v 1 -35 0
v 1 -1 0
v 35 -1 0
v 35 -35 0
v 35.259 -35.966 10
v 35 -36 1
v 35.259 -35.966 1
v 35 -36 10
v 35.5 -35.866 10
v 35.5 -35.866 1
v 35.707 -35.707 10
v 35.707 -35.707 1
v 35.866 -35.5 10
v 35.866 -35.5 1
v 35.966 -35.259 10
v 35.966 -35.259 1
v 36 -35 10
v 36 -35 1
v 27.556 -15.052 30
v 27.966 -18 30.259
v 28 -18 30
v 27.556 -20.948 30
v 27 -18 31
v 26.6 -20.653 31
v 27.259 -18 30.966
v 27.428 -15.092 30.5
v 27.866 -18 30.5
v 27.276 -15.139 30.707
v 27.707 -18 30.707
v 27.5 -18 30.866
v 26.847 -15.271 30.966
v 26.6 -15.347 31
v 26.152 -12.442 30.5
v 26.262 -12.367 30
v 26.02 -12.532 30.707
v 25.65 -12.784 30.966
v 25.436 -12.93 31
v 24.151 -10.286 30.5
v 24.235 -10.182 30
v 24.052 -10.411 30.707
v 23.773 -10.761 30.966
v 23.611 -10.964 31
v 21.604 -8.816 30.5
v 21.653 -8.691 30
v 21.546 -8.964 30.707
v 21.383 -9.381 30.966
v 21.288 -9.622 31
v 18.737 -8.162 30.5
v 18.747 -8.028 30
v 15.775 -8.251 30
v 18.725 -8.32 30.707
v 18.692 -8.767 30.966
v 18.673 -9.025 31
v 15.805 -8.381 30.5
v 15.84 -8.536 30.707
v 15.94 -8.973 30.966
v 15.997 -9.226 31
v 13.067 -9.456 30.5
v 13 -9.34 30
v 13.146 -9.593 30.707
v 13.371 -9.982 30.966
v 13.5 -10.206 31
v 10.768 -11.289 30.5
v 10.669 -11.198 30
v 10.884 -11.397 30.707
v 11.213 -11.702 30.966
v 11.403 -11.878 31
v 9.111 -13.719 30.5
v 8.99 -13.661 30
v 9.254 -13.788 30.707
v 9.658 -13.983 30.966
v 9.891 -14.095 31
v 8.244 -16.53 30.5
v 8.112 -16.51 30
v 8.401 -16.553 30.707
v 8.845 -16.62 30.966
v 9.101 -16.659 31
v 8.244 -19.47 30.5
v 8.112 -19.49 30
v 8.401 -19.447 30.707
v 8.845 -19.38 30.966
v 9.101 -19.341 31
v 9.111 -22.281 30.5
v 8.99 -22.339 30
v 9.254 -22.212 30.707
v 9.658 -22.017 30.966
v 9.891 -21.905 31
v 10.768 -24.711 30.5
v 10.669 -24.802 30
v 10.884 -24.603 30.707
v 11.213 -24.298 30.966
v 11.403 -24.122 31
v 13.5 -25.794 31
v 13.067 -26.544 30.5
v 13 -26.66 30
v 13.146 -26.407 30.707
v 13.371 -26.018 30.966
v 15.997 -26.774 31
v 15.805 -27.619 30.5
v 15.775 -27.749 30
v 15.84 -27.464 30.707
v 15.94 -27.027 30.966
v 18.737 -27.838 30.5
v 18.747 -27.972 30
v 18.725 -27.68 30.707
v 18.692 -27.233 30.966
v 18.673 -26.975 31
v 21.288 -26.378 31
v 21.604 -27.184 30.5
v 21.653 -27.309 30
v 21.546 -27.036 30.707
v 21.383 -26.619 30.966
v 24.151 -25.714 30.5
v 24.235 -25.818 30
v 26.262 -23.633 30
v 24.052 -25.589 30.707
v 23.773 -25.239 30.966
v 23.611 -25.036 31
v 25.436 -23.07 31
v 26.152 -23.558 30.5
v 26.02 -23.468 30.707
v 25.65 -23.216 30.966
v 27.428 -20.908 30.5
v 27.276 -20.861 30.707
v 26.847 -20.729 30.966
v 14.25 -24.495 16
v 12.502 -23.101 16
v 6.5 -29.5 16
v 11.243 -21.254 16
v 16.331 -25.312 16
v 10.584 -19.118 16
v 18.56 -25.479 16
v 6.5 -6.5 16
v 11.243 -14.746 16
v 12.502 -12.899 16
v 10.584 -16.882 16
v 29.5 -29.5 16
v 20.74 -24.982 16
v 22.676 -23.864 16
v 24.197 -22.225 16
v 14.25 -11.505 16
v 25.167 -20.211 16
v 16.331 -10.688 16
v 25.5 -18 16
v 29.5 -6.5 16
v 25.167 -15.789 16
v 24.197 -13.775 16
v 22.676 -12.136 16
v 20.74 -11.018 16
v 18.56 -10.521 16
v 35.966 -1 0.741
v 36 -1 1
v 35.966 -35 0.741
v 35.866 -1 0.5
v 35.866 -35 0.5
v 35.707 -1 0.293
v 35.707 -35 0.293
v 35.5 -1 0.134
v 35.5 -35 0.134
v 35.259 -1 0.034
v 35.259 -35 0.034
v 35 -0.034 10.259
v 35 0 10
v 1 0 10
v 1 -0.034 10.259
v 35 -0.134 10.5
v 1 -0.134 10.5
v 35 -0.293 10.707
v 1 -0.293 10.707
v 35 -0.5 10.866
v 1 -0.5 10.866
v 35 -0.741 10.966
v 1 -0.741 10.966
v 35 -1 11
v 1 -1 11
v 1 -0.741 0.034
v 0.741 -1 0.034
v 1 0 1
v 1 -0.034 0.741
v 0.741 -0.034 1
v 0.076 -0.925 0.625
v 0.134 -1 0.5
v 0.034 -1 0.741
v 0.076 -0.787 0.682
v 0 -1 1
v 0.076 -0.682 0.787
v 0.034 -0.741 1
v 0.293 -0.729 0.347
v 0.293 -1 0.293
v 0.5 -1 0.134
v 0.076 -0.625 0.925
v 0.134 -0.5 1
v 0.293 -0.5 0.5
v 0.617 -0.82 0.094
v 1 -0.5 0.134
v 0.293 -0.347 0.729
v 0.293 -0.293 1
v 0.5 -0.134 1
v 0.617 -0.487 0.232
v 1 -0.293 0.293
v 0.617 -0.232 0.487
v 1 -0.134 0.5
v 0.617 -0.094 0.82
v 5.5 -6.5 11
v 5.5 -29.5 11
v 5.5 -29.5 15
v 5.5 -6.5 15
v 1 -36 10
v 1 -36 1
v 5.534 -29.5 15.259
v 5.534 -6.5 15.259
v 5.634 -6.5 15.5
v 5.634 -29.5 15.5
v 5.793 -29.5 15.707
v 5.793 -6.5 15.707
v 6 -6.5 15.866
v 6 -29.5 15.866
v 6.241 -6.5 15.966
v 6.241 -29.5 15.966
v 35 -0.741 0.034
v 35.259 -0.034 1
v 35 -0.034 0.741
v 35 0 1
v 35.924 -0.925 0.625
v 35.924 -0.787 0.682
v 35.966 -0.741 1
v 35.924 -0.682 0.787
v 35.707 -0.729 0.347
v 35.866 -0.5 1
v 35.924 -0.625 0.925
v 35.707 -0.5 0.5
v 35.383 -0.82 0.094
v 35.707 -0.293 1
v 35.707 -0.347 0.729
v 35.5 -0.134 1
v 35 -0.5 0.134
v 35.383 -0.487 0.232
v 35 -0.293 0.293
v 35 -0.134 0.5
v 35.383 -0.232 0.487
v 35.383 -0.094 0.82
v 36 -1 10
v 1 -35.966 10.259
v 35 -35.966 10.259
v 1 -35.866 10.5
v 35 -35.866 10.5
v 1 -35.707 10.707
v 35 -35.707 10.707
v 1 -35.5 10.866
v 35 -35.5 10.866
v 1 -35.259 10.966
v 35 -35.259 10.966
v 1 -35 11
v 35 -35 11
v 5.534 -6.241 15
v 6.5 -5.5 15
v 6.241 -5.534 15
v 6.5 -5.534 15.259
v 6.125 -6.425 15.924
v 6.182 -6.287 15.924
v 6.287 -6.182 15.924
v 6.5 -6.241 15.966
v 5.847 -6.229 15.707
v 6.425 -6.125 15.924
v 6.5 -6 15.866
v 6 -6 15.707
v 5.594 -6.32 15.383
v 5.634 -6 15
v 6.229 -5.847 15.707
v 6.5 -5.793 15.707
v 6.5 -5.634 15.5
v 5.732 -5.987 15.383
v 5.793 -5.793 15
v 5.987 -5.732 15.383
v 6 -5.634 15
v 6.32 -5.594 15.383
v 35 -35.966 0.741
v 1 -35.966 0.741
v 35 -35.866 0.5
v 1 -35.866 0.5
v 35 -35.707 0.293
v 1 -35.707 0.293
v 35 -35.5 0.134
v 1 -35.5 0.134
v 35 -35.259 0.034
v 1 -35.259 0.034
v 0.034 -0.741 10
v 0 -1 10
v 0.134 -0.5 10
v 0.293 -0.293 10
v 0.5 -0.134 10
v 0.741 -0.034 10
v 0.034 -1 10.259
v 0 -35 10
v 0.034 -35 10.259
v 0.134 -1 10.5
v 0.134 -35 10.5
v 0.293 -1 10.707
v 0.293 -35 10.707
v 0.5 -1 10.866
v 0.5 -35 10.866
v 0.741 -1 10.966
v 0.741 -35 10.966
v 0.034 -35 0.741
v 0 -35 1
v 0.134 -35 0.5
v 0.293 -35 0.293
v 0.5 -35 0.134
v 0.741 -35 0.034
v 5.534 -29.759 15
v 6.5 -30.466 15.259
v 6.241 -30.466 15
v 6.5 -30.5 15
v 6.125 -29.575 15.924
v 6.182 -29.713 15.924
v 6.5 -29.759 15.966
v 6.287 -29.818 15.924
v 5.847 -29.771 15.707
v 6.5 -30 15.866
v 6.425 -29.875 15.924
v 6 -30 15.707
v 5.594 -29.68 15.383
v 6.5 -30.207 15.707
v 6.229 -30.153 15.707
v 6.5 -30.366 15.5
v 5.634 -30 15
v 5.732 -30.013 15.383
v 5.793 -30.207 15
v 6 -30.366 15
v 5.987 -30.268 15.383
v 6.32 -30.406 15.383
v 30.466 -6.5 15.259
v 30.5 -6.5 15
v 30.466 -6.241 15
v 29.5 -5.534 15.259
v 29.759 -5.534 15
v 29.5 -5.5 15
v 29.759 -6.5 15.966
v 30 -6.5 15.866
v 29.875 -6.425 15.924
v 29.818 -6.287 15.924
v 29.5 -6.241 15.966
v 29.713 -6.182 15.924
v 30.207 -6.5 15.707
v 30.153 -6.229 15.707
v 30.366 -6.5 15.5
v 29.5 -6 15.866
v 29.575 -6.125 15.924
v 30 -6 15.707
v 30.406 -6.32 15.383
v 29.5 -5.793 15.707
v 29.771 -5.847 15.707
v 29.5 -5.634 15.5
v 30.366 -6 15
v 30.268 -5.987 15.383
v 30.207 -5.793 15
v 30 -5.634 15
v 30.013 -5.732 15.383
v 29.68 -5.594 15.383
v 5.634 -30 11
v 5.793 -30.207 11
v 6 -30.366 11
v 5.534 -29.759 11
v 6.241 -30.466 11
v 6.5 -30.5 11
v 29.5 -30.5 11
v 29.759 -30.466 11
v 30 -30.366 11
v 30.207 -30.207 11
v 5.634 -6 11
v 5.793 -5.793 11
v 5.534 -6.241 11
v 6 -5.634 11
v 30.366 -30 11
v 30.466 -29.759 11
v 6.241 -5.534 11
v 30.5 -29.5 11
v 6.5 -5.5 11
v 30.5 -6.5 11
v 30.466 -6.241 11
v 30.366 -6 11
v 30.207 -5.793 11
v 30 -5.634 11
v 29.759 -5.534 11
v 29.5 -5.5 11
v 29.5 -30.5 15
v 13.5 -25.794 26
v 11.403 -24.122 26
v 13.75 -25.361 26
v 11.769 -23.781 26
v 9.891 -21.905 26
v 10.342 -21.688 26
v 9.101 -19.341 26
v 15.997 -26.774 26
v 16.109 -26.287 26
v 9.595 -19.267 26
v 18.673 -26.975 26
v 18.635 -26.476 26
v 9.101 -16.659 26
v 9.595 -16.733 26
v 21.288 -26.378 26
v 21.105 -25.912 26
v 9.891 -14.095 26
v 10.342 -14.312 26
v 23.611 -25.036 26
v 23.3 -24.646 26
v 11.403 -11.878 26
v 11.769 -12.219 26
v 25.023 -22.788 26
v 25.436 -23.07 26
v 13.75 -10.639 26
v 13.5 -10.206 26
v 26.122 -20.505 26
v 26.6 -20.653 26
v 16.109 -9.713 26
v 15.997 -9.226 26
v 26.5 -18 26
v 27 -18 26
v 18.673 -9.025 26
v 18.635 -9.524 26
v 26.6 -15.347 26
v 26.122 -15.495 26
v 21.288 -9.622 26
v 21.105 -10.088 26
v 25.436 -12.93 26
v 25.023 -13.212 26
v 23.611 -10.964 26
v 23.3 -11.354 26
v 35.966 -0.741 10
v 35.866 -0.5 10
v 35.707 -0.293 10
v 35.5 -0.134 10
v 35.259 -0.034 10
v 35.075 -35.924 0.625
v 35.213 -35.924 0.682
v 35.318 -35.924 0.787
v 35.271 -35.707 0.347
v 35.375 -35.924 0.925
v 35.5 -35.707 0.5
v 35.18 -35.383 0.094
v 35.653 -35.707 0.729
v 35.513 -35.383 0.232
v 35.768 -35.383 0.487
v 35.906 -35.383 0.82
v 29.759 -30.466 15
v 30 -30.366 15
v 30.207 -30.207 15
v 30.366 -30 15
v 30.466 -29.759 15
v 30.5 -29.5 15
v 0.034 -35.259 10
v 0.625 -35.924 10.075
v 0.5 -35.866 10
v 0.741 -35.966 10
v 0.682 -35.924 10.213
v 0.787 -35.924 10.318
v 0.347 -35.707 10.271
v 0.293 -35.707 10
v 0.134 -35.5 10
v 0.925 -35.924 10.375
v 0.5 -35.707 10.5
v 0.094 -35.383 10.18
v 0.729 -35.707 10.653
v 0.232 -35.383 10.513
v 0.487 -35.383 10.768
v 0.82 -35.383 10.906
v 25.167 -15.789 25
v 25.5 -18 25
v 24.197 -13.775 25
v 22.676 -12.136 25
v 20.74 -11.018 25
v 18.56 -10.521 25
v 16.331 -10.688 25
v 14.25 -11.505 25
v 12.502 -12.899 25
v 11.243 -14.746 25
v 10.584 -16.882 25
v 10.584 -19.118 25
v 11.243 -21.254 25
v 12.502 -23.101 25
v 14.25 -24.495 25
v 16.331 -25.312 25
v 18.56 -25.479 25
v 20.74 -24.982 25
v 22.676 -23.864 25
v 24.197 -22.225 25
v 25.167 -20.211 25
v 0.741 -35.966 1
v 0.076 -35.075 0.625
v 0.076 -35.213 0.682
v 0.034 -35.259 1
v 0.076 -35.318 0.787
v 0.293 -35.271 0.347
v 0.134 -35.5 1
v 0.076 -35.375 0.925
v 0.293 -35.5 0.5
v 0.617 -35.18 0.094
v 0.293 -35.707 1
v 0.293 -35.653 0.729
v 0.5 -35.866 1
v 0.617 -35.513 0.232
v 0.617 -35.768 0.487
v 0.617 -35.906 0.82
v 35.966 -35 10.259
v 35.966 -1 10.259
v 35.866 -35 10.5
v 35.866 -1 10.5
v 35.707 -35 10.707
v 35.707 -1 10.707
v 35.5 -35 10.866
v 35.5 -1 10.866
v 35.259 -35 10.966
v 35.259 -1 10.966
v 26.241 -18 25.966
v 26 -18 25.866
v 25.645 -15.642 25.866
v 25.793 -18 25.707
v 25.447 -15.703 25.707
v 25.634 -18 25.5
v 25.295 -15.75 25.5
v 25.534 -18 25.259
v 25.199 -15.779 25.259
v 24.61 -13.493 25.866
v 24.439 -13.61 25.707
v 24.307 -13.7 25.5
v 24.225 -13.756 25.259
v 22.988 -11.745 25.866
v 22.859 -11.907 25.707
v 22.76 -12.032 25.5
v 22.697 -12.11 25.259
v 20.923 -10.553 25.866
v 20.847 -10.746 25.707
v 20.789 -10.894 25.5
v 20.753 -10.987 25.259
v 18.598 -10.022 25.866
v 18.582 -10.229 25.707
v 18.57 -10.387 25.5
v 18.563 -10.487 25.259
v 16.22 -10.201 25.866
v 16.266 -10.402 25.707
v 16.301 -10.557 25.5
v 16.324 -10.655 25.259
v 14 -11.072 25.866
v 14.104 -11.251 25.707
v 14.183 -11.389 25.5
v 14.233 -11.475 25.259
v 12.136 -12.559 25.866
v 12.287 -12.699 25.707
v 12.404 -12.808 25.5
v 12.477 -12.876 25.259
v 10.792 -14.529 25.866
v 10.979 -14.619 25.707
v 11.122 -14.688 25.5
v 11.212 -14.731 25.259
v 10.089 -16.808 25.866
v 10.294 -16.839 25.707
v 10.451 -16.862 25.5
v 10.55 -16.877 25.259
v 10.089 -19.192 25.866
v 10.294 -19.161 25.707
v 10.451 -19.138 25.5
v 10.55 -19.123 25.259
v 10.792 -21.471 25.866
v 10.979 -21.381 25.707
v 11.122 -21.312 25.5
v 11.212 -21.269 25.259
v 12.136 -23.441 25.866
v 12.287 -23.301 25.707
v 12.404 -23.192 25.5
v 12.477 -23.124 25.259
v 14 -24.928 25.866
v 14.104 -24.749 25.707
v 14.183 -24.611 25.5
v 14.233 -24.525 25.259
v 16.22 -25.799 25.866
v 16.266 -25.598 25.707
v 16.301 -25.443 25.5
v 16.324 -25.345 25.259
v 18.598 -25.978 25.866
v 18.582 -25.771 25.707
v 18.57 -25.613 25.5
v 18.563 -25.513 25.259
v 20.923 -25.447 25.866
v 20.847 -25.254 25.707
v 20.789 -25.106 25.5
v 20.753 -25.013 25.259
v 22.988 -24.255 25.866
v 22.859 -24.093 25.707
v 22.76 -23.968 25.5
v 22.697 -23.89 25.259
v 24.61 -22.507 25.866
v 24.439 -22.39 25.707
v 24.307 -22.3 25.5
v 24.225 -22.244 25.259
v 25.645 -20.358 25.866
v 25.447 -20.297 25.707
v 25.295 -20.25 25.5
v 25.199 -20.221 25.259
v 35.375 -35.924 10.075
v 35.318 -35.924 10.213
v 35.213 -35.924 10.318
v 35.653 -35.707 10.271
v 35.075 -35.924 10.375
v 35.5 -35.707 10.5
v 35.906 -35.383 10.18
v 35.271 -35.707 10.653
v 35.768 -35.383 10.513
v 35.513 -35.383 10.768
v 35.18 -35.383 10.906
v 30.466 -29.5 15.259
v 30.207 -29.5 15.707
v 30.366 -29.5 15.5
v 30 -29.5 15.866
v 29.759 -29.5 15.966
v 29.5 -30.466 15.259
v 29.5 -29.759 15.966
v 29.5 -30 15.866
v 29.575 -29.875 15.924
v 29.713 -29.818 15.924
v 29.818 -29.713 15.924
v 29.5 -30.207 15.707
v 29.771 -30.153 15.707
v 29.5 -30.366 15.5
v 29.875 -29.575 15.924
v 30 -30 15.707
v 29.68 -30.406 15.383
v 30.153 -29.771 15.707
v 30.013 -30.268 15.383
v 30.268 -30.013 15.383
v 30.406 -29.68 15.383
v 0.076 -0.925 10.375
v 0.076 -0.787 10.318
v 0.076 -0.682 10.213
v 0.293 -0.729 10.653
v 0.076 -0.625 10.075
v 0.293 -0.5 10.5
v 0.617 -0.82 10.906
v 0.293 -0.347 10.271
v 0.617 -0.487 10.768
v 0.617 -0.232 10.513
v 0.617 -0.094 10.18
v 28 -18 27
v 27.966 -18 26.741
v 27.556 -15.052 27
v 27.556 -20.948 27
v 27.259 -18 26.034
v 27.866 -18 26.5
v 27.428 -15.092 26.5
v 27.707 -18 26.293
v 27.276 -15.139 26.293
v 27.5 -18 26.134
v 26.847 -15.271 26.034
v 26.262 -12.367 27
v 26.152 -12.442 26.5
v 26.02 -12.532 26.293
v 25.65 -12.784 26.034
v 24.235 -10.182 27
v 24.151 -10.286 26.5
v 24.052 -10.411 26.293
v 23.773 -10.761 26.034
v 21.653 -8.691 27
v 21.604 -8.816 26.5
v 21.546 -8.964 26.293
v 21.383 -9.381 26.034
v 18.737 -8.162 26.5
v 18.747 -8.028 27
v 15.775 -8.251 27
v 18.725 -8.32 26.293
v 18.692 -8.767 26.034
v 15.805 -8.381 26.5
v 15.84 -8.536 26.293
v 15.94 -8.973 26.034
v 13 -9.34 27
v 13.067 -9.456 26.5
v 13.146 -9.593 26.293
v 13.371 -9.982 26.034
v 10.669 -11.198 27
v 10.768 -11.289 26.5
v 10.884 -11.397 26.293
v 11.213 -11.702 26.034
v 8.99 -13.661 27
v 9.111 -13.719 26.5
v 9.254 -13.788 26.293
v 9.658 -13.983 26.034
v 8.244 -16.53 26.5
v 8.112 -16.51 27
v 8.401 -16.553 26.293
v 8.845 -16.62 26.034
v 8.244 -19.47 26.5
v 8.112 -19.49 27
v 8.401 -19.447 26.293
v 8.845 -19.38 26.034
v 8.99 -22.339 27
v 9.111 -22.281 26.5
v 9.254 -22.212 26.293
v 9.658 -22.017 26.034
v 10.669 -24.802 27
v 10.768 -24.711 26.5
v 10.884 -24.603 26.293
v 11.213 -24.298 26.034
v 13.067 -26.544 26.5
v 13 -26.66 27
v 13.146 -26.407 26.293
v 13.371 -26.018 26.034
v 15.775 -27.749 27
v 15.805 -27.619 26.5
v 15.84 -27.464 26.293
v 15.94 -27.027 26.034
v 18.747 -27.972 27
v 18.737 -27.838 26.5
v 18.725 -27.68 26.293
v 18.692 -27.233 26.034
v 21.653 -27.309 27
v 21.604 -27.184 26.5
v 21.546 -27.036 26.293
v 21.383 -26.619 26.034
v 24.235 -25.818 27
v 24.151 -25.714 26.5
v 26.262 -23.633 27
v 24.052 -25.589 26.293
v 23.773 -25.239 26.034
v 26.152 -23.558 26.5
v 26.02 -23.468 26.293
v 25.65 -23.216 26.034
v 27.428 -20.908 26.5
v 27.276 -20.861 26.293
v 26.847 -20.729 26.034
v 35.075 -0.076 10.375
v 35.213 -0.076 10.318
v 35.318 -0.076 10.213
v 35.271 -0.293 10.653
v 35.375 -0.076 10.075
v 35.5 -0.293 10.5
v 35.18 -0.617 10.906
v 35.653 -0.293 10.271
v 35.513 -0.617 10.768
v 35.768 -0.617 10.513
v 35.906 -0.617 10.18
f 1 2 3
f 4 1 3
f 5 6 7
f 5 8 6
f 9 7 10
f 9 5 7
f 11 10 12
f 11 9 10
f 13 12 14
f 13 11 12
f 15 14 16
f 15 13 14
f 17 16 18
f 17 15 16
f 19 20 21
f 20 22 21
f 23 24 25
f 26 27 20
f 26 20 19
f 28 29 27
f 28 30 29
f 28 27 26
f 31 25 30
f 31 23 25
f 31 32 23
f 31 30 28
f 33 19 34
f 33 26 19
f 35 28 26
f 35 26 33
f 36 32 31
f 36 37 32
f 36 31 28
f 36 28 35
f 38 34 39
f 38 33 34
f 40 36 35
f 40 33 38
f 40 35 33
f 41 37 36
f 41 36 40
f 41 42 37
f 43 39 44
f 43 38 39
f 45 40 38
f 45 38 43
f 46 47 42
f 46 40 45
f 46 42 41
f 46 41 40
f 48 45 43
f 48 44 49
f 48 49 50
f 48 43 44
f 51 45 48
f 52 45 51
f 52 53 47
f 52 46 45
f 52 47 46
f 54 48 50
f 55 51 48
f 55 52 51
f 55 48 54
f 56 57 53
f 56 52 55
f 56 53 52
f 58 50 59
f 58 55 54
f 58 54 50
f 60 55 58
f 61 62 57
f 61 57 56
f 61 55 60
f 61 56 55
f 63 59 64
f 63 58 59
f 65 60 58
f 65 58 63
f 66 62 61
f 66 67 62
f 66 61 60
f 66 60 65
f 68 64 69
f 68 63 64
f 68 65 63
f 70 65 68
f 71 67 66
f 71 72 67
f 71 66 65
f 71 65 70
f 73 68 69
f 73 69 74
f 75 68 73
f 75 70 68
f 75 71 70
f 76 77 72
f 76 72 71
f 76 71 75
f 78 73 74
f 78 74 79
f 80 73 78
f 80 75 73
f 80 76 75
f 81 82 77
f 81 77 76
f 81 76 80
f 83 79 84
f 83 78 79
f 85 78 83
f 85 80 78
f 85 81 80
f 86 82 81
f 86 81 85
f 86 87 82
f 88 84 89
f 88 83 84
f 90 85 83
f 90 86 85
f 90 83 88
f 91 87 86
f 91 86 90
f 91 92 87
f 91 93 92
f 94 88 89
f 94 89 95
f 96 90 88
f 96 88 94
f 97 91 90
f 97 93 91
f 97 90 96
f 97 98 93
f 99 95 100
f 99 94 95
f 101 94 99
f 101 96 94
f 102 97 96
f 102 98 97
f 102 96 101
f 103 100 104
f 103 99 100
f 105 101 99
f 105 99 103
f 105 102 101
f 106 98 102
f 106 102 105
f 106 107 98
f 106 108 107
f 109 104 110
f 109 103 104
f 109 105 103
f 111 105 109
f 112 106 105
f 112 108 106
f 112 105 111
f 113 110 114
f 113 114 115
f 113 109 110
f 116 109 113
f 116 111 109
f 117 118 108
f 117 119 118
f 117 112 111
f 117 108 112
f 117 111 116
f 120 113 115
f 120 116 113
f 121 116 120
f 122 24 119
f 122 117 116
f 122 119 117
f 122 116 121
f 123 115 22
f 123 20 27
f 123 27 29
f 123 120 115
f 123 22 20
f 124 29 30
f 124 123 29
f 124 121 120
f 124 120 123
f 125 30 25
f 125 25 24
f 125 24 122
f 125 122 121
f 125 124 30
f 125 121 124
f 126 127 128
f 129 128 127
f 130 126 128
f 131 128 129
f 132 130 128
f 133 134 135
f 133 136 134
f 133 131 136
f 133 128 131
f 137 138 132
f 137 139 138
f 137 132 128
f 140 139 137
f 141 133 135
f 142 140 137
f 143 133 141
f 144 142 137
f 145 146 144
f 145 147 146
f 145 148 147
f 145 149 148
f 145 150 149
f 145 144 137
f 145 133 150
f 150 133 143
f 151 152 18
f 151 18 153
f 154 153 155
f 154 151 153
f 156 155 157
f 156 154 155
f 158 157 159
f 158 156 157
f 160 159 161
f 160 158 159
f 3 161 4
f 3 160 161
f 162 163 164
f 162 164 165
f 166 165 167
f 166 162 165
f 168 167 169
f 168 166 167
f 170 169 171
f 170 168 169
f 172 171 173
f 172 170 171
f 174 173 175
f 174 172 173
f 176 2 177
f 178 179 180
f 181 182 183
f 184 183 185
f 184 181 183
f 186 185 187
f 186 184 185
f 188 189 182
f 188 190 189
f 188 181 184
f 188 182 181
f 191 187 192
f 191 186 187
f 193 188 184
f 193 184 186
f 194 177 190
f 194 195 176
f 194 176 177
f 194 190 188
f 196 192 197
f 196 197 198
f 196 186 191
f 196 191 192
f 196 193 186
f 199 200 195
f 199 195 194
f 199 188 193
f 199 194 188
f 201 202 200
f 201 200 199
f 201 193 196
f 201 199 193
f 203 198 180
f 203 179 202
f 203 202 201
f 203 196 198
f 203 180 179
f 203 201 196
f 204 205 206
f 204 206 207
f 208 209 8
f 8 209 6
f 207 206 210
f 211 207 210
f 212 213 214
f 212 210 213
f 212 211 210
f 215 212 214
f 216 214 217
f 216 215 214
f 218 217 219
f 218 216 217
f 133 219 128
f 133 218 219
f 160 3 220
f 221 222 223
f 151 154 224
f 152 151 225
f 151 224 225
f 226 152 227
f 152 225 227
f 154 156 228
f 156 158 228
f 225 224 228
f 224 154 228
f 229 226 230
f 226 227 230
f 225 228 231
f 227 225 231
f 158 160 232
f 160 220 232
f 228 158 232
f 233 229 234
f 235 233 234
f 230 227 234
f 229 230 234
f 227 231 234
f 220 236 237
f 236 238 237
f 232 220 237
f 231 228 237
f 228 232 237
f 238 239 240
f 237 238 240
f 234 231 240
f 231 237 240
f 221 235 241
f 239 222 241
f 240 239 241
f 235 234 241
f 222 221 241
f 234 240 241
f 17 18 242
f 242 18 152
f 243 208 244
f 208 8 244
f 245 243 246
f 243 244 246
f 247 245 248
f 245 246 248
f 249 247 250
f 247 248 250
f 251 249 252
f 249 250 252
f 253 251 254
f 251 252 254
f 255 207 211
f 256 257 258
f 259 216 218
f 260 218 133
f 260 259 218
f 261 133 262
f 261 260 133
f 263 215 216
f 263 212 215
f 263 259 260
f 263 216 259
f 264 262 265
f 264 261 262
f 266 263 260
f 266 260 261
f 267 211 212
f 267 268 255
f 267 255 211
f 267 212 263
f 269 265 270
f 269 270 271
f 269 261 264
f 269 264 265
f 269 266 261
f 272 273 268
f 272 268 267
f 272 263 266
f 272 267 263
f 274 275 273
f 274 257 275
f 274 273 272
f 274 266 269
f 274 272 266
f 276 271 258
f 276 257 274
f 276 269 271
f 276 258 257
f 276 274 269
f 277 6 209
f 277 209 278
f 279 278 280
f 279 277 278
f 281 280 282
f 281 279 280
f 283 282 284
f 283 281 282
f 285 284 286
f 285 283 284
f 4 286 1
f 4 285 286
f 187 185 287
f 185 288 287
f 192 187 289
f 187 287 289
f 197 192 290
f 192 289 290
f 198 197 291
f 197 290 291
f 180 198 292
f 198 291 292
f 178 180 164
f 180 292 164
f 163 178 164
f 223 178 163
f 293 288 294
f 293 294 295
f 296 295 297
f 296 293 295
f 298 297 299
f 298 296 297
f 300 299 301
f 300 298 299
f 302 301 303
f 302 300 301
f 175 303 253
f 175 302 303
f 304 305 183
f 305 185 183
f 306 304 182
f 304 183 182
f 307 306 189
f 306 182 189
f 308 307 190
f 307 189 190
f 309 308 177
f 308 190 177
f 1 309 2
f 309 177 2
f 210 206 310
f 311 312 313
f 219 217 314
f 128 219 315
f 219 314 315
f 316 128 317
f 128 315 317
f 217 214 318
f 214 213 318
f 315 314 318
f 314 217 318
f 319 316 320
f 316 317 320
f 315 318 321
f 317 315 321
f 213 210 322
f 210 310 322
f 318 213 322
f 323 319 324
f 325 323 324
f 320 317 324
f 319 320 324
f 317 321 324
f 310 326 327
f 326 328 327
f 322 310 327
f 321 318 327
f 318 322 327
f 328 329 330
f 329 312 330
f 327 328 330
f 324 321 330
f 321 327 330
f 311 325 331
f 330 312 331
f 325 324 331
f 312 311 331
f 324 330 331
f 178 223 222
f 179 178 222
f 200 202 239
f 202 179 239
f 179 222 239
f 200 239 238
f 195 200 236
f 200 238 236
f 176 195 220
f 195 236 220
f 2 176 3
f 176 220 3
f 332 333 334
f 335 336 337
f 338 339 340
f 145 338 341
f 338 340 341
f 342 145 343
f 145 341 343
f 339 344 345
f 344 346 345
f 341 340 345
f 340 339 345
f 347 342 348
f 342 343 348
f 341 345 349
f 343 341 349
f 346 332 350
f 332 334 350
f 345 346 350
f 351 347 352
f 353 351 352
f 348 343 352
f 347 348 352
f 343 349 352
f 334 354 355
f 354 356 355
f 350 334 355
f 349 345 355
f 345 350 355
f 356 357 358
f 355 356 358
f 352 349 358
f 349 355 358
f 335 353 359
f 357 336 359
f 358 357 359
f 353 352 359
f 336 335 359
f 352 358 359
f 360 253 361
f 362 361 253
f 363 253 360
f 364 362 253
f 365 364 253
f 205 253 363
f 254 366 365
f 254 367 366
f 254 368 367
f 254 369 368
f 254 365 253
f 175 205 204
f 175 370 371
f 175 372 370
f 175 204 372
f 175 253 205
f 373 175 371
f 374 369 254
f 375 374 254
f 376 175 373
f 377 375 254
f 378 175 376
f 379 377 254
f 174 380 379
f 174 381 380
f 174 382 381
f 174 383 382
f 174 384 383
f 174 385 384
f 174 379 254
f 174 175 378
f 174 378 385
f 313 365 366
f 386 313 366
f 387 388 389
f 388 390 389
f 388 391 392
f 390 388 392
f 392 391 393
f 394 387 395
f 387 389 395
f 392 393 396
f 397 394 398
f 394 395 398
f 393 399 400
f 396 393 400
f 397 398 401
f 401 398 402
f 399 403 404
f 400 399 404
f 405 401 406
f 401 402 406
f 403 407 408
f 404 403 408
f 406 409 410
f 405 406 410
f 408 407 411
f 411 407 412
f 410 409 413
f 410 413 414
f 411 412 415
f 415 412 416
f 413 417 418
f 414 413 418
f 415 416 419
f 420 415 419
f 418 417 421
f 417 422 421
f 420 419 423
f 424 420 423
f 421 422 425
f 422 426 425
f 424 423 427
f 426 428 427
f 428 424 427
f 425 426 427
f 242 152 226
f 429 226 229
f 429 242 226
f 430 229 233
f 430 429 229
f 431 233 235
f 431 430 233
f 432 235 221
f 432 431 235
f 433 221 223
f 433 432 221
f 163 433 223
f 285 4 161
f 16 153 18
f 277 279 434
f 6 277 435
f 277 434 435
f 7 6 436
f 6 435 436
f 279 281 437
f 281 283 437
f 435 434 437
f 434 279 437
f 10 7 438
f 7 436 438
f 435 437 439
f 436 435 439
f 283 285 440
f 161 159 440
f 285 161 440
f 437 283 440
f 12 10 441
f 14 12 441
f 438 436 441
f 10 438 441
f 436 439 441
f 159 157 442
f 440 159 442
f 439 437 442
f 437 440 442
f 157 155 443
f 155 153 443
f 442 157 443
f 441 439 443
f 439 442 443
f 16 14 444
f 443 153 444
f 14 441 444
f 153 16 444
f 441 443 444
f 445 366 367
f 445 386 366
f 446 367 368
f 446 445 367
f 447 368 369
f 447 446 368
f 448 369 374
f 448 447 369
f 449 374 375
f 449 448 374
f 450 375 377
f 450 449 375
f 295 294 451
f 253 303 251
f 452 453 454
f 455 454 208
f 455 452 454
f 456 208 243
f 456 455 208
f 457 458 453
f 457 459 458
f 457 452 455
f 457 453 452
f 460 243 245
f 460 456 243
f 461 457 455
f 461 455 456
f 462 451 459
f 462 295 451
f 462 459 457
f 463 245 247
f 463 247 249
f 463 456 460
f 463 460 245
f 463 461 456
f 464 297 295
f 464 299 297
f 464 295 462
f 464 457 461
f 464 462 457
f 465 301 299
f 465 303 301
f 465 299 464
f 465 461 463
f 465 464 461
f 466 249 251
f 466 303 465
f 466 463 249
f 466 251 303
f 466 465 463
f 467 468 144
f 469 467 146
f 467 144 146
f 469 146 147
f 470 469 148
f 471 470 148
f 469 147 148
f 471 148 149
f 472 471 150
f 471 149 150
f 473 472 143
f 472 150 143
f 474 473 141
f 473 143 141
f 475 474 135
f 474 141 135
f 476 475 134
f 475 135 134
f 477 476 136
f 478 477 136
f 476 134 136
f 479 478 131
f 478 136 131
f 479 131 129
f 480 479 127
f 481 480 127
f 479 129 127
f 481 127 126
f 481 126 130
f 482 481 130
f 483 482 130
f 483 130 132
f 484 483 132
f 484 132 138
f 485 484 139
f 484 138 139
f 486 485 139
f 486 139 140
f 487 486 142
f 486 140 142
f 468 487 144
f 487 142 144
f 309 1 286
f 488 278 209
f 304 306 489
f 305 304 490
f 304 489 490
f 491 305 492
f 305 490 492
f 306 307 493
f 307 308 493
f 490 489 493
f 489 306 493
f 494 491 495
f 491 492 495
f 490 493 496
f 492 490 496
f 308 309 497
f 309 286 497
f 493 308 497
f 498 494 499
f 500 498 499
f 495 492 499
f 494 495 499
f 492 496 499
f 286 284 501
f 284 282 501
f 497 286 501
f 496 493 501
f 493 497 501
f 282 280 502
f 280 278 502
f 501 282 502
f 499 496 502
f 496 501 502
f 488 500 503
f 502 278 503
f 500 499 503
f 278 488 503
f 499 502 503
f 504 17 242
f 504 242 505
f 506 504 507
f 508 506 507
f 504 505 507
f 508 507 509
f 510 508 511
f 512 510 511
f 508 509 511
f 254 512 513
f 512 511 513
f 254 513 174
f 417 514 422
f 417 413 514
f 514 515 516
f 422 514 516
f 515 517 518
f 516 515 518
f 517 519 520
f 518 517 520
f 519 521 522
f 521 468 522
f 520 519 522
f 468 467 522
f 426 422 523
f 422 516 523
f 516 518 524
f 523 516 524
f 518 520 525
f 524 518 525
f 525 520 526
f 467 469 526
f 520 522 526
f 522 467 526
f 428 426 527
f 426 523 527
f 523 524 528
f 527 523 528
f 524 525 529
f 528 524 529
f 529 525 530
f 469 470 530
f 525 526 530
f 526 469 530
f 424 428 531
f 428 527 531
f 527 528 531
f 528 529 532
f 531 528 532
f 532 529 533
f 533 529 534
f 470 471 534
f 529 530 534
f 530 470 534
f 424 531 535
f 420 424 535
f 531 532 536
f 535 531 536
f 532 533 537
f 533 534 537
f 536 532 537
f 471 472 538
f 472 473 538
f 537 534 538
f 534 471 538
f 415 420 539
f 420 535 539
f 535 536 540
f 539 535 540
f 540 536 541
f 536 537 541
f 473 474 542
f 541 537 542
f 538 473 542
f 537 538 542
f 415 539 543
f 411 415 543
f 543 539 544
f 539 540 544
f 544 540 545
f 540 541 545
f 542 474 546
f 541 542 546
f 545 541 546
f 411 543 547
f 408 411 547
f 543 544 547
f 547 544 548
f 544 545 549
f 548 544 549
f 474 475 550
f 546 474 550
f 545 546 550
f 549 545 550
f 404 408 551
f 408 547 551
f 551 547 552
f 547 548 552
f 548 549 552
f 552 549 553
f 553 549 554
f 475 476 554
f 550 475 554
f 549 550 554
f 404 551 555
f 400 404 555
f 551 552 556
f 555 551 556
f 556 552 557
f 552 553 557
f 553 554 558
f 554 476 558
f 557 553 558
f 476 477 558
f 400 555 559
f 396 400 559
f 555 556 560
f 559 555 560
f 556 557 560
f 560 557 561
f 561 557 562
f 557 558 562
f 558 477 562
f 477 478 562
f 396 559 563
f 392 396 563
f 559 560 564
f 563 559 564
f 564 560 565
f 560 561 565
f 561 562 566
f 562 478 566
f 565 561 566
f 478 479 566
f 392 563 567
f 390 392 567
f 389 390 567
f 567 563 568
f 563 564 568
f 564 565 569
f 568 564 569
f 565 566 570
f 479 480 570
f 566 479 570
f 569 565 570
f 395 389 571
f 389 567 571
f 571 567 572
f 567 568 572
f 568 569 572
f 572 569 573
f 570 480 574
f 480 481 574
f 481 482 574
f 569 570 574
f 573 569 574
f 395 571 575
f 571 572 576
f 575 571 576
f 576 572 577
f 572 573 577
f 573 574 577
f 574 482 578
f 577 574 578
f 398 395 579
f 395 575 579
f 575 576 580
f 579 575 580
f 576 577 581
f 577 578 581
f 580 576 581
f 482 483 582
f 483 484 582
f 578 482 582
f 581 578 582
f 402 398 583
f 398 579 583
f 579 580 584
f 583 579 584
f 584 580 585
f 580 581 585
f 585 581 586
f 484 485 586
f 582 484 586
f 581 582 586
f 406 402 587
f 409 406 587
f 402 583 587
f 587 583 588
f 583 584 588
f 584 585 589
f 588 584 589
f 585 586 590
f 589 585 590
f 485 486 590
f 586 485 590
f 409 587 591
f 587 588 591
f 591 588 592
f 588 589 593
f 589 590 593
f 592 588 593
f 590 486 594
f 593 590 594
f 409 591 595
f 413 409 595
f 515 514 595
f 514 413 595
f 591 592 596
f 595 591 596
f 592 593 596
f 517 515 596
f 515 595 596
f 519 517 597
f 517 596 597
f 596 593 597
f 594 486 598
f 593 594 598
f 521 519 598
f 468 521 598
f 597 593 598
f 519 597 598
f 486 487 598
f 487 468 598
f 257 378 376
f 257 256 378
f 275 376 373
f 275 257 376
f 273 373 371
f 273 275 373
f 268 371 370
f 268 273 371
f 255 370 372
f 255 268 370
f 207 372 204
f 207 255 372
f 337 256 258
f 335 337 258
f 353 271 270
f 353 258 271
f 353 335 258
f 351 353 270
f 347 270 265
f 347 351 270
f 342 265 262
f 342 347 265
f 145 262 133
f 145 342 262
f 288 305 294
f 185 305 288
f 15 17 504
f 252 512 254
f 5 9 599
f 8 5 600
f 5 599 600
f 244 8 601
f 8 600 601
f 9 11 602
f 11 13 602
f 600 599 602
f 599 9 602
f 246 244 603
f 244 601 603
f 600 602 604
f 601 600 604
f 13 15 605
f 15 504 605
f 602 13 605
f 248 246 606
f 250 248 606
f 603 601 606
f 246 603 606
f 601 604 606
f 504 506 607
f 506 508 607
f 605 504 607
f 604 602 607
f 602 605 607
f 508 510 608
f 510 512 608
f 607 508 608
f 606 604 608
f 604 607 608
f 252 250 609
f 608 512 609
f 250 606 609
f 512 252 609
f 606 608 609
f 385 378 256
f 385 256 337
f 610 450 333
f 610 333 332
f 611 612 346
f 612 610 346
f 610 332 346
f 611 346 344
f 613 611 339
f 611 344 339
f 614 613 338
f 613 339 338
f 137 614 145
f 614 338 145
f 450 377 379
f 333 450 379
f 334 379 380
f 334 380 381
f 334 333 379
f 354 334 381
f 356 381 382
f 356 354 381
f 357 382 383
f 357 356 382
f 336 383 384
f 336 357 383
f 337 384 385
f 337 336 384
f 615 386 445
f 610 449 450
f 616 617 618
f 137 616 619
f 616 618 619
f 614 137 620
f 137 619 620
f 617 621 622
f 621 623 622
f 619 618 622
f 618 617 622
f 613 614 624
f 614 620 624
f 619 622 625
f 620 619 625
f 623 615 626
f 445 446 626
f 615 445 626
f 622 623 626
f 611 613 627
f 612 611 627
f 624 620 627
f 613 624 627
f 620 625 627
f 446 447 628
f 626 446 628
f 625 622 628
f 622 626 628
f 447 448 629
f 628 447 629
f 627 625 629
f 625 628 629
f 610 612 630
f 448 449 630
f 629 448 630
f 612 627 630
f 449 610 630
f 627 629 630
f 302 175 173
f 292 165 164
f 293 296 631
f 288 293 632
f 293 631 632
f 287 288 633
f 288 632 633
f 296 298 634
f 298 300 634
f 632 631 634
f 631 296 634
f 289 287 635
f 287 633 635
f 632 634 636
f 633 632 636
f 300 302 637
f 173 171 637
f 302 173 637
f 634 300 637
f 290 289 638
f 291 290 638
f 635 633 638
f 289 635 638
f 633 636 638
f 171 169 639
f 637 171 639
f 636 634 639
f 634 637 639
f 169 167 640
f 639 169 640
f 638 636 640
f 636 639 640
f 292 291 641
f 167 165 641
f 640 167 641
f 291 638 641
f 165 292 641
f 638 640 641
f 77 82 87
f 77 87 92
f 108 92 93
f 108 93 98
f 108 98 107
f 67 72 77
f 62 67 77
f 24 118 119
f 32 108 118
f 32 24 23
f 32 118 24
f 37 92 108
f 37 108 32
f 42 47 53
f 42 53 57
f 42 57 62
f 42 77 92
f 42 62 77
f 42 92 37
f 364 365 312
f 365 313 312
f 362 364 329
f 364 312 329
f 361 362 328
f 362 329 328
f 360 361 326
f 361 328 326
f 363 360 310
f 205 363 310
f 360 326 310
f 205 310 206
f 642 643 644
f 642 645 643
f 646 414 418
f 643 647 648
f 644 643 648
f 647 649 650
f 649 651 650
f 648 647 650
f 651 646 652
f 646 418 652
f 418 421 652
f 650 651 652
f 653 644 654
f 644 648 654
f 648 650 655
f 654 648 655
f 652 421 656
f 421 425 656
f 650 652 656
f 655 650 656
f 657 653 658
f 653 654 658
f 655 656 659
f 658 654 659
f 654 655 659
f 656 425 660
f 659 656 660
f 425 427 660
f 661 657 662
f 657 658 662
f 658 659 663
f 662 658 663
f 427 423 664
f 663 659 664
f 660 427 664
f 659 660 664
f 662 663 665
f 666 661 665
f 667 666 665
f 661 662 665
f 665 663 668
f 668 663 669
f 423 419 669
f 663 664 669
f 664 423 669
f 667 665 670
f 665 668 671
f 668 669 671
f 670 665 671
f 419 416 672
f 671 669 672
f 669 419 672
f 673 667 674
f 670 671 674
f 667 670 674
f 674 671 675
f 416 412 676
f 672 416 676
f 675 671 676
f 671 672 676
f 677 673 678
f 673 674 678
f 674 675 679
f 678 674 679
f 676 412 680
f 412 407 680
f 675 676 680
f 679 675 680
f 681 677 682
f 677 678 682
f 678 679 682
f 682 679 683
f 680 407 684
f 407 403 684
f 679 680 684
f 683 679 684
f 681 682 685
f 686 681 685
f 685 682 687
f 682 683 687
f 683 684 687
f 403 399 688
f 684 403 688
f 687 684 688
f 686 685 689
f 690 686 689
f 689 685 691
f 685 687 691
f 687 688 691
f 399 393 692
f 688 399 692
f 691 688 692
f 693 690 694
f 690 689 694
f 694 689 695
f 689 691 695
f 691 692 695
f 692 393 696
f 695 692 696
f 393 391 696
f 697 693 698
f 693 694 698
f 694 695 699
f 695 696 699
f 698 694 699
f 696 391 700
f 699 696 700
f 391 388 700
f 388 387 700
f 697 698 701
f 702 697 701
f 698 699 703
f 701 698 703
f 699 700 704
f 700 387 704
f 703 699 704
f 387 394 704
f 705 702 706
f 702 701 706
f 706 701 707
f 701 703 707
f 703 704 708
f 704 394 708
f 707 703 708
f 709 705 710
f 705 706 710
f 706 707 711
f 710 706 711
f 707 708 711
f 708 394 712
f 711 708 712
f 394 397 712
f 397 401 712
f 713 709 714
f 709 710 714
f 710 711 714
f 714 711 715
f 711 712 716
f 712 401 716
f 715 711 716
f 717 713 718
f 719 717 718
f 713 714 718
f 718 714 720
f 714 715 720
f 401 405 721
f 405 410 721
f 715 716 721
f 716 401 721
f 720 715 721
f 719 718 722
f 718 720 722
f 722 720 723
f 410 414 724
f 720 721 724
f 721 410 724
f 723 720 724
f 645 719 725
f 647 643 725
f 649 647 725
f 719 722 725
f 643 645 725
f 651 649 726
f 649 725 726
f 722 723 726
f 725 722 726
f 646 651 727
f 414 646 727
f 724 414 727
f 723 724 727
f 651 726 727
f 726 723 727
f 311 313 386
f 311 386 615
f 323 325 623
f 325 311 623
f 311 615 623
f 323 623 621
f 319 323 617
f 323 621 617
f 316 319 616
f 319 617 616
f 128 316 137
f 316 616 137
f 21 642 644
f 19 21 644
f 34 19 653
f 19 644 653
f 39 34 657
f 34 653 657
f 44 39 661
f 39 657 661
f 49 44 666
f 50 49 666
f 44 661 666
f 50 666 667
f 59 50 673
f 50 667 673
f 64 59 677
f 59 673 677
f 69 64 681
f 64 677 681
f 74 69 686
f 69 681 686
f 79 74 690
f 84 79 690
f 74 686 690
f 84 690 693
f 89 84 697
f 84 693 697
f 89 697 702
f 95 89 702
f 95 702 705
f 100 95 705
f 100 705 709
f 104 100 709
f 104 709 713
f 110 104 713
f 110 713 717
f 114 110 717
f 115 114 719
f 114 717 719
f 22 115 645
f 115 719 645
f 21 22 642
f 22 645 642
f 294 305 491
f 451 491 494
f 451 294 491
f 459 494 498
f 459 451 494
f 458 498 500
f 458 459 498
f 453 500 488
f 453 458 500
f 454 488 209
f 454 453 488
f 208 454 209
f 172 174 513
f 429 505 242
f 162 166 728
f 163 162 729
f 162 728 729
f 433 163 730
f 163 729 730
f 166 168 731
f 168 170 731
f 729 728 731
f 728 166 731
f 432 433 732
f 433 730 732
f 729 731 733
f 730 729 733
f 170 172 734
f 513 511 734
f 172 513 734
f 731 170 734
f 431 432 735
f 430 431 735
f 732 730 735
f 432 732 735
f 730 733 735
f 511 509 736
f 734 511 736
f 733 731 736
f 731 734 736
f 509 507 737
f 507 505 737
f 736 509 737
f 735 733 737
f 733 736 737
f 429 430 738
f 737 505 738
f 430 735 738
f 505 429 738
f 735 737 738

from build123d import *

# Parameters (mm, degrees)
SKETCH_1_W      = 36
SKETCH_1_H      = 36
EXTRUDE_1_DEPTH = 11
FILLET_1_R      = 1
SKETCH_2_W      = 25
SKETCH_2_H      = 25
EXTRUDE_2_DEPTH = 5
FILLET_2_R      = 1
SKETCH_3_R      = 7.5
EXTRUDE_3_DEPTH = 10
SKETCH_4_R      = 10
EXTRUDE_4_DEPTH = 5
FILLET_3_R      = 1


with BuildPart() as part:
    # 草图1 → 凸台-拉伸1 (new body)
    with BuildSketch(Plane.XY):
        with Locations((18, -18)):
            Rectangle(SKETCH_1_W, SKETCH_1_H)
    extrude(amount=EXTRUDE_1_DEPTH)

    # 圆角1
    fillet_1_edges = [part.edges().sort_by_distance(p)[0] for p in [
        (36, -18, 11),
        (18, 0, 11),
        (0, -18, 11),
        (18, 0, 0),
        (36, -18, 0),
        (18, -36, 0),
        (0, -18, 0),
        (0, 0, 5.5),
        (36, 0, 5.5),
        (36, -36, 5.5),
        (0, -36, 5.5),
        (18, -36, 11),
    ]]
    fillet(fillet_1_edges, radius=FILLET_1_R)

    # 草图2 → 凸台-拉伸2 (add)
    with BuildSketch(Plane.XY.offset(11)):
        with Locations((18, -18)):
            Rectangle(SKETCH_2_W, SKETCH_2_H)
    extrude(amount=EXTRUDE_2_DEPTH)

    # 圆角2
    fillet_2_edges = [part.edges().sort_by_distance(p)[0] for p in [
        (5.5, -5.5, 13.5),
        (5.5, -30.5, 13.5),
        (30.5, -30.5, 13.5),
        (30.5, -5.5, 13.5),
        (5.5, -18, 16),
        (18, -30.5, 16),
        (30.5, -18, 16),
        (18, -5.5, 16),
    ]]
    fillet(fillet_2_edges, radius=FILLET_2_R)

    # 草图3 → 凸台-拉伸3 (add)
    with BuildSketch(Plane.XY.offset(16)):
        with Locations((18, -18)):
            Circle(SKETCH_3_R)
    extrude(amount=EXTRUDE_3_DEPTH)

    # 草图4 → 凸台-拉伸4 (add)
    with BuildSketch(Plane.XY.offset(26)):
        with Locations((18, -18)):
            Circle(SKETCH_4_R)
    extrude(amount=EXTRUDE_4_DEPTH)

    # 圆角3
    fillet_3_edges = [part.edges().sort_by_distance(p)[0] for p in [
        (10.5, -18, 26),
        (8, -18, 26),
        (8, -18, 31),
    ]]
    fillet(fillet_3_edges, radius=FILLET_3_R)


solid = part.part
